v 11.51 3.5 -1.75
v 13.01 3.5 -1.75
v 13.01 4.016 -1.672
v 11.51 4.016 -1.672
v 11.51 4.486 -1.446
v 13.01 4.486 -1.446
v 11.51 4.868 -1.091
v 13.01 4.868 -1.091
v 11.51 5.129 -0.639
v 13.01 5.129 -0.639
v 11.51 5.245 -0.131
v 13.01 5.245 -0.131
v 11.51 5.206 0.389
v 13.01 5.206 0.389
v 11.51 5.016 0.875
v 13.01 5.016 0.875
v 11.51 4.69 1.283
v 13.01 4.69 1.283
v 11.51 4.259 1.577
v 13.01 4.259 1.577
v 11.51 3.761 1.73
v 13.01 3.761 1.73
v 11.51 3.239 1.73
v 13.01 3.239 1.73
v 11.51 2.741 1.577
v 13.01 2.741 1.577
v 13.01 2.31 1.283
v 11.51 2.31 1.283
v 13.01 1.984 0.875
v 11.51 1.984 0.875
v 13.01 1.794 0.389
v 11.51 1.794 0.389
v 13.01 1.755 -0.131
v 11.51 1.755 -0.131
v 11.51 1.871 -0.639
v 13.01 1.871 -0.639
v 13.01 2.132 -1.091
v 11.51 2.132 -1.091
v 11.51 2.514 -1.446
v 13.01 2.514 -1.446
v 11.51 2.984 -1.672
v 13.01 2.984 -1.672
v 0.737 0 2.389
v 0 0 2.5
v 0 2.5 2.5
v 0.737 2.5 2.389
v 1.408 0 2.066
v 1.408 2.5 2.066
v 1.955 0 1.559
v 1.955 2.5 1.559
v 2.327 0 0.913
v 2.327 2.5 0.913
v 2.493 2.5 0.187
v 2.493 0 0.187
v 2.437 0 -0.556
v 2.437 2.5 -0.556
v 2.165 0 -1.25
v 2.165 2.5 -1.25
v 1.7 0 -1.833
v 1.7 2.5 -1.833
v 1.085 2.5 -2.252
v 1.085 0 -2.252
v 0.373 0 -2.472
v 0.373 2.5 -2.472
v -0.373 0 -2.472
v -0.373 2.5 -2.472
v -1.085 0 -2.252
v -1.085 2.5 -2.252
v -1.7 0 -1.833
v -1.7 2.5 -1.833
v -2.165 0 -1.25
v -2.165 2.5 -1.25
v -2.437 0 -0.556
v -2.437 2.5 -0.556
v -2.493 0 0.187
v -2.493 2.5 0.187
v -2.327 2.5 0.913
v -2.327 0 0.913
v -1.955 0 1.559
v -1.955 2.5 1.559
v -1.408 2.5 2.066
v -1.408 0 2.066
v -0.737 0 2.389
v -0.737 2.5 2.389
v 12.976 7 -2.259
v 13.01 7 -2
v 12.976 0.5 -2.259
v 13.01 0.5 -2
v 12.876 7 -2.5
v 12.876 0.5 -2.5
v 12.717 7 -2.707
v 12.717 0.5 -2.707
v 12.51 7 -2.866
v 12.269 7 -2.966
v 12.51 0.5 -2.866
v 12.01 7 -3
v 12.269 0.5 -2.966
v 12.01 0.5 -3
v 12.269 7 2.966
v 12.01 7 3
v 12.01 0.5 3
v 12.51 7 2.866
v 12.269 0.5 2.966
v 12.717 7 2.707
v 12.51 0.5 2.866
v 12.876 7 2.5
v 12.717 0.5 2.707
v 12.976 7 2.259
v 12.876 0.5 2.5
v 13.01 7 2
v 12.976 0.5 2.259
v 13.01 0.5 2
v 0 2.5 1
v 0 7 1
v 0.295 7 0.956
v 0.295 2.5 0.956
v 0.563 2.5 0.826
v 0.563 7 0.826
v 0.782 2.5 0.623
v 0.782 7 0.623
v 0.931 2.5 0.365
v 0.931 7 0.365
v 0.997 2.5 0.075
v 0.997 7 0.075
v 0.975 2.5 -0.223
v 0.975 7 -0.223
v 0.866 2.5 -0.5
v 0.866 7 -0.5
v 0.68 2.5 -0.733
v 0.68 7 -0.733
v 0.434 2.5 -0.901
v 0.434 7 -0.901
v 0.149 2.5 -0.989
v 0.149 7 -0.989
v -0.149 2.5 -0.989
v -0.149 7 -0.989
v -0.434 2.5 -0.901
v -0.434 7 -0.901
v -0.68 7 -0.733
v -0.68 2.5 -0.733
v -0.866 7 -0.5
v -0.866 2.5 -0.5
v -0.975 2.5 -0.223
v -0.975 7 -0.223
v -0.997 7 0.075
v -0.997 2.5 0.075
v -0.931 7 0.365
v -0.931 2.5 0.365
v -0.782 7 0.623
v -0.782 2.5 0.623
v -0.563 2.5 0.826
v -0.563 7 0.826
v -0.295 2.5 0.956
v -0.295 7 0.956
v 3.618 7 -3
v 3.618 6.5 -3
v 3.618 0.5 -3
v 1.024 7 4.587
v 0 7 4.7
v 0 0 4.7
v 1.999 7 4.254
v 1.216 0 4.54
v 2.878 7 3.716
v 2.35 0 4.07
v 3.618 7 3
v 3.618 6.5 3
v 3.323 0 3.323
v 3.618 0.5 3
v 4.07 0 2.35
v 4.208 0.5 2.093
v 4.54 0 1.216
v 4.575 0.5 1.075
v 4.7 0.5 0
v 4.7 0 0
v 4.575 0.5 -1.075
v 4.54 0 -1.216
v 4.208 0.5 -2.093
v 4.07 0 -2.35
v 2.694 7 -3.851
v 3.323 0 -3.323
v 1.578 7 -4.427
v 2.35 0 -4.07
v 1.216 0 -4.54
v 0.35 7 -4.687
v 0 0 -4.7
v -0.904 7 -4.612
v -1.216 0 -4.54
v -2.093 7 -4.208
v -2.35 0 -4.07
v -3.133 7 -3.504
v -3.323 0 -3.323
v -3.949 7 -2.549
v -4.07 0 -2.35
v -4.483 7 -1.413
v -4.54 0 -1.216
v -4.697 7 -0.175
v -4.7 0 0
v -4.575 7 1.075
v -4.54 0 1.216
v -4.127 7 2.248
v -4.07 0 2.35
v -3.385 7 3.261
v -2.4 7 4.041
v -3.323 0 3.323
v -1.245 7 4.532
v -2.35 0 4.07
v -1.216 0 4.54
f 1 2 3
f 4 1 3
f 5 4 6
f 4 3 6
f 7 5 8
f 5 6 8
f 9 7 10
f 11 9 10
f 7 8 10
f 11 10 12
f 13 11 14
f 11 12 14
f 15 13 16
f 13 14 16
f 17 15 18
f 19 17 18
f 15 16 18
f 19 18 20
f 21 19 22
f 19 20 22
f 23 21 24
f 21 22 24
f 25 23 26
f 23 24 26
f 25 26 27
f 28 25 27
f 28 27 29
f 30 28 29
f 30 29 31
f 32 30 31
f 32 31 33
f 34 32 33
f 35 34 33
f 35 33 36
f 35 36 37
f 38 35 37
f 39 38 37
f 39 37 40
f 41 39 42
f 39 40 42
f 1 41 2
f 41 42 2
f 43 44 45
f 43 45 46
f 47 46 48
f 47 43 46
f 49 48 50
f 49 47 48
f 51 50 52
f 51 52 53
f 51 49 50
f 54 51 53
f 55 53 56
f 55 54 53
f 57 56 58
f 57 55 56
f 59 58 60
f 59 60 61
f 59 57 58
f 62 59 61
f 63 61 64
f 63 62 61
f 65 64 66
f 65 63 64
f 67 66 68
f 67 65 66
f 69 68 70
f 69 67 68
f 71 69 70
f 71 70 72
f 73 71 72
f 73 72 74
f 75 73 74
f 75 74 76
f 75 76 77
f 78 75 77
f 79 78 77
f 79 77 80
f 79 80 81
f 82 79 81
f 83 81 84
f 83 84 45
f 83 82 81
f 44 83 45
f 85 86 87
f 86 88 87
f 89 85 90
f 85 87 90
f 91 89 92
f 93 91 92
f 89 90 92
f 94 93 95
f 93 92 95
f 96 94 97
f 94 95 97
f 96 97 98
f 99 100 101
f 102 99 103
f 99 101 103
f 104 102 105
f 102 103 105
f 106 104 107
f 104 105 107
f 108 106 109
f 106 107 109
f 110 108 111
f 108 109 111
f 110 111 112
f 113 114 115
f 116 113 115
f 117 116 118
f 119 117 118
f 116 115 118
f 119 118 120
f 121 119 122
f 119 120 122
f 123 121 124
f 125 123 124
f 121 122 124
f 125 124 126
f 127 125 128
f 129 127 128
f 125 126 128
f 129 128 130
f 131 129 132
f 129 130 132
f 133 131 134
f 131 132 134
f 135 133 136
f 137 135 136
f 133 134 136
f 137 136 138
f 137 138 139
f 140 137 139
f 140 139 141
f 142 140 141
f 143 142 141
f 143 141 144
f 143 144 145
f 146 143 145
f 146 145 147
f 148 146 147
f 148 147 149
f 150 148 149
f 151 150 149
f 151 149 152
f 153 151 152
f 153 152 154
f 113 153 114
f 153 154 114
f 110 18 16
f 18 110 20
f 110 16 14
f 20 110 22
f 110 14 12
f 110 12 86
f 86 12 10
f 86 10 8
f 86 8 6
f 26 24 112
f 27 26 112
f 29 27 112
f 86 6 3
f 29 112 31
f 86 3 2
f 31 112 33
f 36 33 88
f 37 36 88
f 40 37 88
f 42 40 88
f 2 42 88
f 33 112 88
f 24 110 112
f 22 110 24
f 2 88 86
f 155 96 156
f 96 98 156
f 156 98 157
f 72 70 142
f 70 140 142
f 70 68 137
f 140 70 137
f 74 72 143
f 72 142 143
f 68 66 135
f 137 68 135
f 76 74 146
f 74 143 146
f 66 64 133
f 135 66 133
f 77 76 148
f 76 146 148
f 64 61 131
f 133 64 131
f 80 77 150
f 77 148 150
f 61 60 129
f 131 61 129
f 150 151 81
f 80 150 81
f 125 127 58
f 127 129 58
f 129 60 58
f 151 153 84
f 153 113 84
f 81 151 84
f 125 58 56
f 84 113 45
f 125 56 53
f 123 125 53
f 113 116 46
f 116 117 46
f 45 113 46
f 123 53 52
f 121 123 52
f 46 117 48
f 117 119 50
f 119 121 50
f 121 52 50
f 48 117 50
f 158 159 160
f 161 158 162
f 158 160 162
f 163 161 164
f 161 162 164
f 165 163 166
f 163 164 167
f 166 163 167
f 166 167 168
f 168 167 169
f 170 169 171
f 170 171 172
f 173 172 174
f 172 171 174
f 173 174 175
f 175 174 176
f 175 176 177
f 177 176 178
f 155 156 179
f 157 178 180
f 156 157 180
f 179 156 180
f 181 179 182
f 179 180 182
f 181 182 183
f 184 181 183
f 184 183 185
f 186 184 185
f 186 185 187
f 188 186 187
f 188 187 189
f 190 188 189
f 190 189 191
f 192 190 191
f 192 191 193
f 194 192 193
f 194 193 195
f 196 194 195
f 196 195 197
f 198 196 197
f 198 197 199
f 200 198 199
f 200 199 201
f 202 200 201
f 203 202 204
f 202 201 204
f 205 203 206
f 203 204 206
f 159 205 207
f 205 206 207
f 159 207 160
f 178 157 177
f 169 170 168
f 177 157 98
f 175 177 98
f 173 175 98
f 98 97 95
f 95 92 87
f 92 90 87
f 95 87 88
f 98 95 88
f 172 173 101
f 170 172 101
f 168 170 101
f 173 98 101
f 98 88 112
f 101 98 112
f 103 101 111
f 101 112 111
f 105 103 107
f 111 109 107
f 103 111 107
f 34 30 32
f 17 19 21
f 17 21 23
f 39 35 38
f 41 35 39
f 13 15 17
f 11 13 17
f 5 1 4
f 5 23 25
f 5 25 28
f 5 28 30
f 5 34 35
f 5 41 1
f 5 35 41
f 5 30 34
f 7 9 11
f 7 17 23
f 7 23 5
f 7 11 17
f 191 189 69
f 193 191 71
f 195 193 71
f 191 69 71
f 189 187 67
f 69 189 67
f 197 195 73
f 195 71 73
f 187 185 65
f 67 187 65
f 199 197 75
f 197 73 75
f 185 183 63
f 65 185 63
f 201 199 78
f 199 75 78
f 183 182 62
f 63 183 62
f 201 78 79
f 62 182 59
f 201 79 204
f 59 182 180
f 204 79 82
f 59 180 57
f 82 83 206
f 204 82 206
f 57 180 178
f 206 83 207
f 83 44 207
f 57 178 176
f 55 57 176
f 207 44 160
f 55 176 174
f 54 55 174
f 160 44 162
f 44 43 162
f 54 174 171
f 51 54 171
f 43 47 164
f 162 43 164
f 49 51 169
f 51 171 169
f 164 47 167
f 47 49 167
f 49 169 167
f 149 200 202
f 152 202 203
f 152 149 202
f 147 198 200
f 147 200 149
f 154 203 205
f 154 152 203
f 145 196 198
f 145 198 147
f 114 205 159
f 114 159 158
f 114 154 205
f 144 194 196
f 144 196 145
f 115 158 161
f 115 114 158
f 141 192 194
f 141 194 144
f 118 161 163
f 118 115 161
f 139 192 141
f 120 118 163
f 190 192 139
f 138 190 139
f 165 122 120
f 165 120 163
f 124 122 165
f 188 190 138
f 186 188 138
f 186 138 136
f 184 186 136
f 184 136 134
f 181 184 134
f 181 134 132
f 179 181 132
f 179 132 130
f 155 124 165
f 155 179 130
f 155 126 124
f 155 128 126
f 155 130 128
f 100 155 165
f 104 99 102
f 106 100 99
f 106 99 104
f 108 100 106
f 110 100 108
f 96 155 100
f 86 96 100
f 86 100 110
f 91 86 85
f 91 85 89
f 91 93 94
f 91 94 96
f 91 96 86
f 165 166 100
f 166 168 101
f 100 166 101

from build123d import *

# Parameters (mm, degrees)
SKETCH1_R           = 4.7
SKETCH1_R_2         = 2.5
BOSS_EXTRUDE1_DEPTH = 2.5
SKETCH2_R           = 4.7
BOSS_EXTRUDE2_DEPTH = 4.5
SKETCH3_R           = 1
CUT_EXTRUDE1_DEPTH  = 4.5
SKETCH6_W           = 6
SKETCH6_H           = 6
BOSS_EXTRUDE3_DEPTH = 8.31
SKETCH7_W           = 6
SKETCH7_H           = 6
BOSS_EXTRUDE4_DEPTH = 2
FILLET1_R           = 1
SKETCH8_R           = 1.75
CUT_EXTRUDE2_DEPTH  = 1.5
BOSS_EXTRUDE5_DEPTH = 0.5


with BuildPart() as part:
    # Sketch1 → Boss-Extrude1 (new body)
    with BuildSketch(Plane(origin=(0, 0, 0), x_dir=(1, 0, 0), z_dir=(0, 1, 0))):
        with Locations(Location((0, 0, 0), (0, 0, 270))):
            Circle(SKETCH1_R)
        with Locations(Location((0, 0, 0), (0, 0, 270))):
            Circle(SKETCH1_R_2, mode=Mode.SUBTRACT)
    extrude(amount=BOSS_EXTRUDE1_DEPTH)

    # Sketch2 → Boss-Extrude2 (add)
    with BuildSketch(Plane(origin=(0, 2.5, 0), x_dir=(1, 0, 0), z_dir=(0, 1, 0))):
        with Locations(Location((0, 0, 0), (0, 0, 270))):
            Circle(SKETCH2_R)
    extrude(amount=BOSS_EXTRUDE2_DEPTH)

    # Sketch3 → Cut-Extrude1 (cut)
    with BuildSketch(Plane(origin=(0, 7, 0), x_dir=(1, 0, 0), z_dir=(0, 1, 0))):
        with Locations(Location((0, 0, 0), (0, 0, 270))):
            Circle(SKETCH3_R)
    extrude(amount=-CUT_EXTRUDE1_DEPTH, mode=Mode.SUBTRACT)



with BuildPart() as body_2:
    # Sketch6 → Boss-Extrude3 (new body)
    with BuildSketch(Plane(origin=(4.7, 0, 0), x_dir=(0, 0, -1), z_dir=(1, 0, 0))):
        with Locations((0, 3.5)):
            Rectangle(SKETCH6_W, SKETCH6_H)
    extrude(amount=BOSS_EXTRUDE3_DEPTH)


with BuildPart() as part_1:
    add(part.part)

    add(body_2.part)  # Boss-Extrude4 merges body 2
    # Sketch7 → Boss-Extrude4 (add)
    with BuildSketch(Plane.ZY.offset(-4.7)):
        with Locations((0, 3.5)):
            Rectangle(SKETCH7_W, SKETCH7_H)
    extrude(amount=BOSS_EXTRUDE4_DEPTH)

    # Fillet1
    fillet1_edges = [part_1.edges().sort_by_distance(p)[0] for p in [
        (13.01, 3.5, -3),
        (13.01, 3.5, 3),
    ]]
    fillet(fillet1_edges, radius=FILLET1_R)

    # Sketch8 → Cut-Extrude2 (cut)
    with BuildSketch(Plane(origin=(13.01, 0, 0), x_dir=(0, 0, -1), z_dir=(1, 0, 0))):
        with Locations((0, 3.5)):
            Circle(SKETCH8_R)
    extrude(amount=-CUT_EXTRUDE2_DEPTH, mode=Mode.SUBTRACT)

    # Sketch9 → Boss-Extrude5 (add)
    with BuildSketch(Plane(origin=(0, 6.5, 0), x_dir=(1, 0, 0), z_dir=(0, 1, 0))):
        with BuildLine():
            Line((13.01, -2), (13.01, 2))
            ThreePointArc((13.01, 2), (12.717106781, 2.707106781), (12.01, 3))
            Line((12.01, 3), (3.618010503, 3))
            ThreePointArc((3.618010503, 3), (4.7, 0), (3.618010503, -3))
            Line((3.618010503, -3), (12.01, -3))
            ThreePointArc((12.01, -3), (12.717106781, -2.707106781), (13.01, -2))
        make_face()
    extrude(amount=BOSS_EXTRUDE5_DEPTH)


solid = part_1.part
